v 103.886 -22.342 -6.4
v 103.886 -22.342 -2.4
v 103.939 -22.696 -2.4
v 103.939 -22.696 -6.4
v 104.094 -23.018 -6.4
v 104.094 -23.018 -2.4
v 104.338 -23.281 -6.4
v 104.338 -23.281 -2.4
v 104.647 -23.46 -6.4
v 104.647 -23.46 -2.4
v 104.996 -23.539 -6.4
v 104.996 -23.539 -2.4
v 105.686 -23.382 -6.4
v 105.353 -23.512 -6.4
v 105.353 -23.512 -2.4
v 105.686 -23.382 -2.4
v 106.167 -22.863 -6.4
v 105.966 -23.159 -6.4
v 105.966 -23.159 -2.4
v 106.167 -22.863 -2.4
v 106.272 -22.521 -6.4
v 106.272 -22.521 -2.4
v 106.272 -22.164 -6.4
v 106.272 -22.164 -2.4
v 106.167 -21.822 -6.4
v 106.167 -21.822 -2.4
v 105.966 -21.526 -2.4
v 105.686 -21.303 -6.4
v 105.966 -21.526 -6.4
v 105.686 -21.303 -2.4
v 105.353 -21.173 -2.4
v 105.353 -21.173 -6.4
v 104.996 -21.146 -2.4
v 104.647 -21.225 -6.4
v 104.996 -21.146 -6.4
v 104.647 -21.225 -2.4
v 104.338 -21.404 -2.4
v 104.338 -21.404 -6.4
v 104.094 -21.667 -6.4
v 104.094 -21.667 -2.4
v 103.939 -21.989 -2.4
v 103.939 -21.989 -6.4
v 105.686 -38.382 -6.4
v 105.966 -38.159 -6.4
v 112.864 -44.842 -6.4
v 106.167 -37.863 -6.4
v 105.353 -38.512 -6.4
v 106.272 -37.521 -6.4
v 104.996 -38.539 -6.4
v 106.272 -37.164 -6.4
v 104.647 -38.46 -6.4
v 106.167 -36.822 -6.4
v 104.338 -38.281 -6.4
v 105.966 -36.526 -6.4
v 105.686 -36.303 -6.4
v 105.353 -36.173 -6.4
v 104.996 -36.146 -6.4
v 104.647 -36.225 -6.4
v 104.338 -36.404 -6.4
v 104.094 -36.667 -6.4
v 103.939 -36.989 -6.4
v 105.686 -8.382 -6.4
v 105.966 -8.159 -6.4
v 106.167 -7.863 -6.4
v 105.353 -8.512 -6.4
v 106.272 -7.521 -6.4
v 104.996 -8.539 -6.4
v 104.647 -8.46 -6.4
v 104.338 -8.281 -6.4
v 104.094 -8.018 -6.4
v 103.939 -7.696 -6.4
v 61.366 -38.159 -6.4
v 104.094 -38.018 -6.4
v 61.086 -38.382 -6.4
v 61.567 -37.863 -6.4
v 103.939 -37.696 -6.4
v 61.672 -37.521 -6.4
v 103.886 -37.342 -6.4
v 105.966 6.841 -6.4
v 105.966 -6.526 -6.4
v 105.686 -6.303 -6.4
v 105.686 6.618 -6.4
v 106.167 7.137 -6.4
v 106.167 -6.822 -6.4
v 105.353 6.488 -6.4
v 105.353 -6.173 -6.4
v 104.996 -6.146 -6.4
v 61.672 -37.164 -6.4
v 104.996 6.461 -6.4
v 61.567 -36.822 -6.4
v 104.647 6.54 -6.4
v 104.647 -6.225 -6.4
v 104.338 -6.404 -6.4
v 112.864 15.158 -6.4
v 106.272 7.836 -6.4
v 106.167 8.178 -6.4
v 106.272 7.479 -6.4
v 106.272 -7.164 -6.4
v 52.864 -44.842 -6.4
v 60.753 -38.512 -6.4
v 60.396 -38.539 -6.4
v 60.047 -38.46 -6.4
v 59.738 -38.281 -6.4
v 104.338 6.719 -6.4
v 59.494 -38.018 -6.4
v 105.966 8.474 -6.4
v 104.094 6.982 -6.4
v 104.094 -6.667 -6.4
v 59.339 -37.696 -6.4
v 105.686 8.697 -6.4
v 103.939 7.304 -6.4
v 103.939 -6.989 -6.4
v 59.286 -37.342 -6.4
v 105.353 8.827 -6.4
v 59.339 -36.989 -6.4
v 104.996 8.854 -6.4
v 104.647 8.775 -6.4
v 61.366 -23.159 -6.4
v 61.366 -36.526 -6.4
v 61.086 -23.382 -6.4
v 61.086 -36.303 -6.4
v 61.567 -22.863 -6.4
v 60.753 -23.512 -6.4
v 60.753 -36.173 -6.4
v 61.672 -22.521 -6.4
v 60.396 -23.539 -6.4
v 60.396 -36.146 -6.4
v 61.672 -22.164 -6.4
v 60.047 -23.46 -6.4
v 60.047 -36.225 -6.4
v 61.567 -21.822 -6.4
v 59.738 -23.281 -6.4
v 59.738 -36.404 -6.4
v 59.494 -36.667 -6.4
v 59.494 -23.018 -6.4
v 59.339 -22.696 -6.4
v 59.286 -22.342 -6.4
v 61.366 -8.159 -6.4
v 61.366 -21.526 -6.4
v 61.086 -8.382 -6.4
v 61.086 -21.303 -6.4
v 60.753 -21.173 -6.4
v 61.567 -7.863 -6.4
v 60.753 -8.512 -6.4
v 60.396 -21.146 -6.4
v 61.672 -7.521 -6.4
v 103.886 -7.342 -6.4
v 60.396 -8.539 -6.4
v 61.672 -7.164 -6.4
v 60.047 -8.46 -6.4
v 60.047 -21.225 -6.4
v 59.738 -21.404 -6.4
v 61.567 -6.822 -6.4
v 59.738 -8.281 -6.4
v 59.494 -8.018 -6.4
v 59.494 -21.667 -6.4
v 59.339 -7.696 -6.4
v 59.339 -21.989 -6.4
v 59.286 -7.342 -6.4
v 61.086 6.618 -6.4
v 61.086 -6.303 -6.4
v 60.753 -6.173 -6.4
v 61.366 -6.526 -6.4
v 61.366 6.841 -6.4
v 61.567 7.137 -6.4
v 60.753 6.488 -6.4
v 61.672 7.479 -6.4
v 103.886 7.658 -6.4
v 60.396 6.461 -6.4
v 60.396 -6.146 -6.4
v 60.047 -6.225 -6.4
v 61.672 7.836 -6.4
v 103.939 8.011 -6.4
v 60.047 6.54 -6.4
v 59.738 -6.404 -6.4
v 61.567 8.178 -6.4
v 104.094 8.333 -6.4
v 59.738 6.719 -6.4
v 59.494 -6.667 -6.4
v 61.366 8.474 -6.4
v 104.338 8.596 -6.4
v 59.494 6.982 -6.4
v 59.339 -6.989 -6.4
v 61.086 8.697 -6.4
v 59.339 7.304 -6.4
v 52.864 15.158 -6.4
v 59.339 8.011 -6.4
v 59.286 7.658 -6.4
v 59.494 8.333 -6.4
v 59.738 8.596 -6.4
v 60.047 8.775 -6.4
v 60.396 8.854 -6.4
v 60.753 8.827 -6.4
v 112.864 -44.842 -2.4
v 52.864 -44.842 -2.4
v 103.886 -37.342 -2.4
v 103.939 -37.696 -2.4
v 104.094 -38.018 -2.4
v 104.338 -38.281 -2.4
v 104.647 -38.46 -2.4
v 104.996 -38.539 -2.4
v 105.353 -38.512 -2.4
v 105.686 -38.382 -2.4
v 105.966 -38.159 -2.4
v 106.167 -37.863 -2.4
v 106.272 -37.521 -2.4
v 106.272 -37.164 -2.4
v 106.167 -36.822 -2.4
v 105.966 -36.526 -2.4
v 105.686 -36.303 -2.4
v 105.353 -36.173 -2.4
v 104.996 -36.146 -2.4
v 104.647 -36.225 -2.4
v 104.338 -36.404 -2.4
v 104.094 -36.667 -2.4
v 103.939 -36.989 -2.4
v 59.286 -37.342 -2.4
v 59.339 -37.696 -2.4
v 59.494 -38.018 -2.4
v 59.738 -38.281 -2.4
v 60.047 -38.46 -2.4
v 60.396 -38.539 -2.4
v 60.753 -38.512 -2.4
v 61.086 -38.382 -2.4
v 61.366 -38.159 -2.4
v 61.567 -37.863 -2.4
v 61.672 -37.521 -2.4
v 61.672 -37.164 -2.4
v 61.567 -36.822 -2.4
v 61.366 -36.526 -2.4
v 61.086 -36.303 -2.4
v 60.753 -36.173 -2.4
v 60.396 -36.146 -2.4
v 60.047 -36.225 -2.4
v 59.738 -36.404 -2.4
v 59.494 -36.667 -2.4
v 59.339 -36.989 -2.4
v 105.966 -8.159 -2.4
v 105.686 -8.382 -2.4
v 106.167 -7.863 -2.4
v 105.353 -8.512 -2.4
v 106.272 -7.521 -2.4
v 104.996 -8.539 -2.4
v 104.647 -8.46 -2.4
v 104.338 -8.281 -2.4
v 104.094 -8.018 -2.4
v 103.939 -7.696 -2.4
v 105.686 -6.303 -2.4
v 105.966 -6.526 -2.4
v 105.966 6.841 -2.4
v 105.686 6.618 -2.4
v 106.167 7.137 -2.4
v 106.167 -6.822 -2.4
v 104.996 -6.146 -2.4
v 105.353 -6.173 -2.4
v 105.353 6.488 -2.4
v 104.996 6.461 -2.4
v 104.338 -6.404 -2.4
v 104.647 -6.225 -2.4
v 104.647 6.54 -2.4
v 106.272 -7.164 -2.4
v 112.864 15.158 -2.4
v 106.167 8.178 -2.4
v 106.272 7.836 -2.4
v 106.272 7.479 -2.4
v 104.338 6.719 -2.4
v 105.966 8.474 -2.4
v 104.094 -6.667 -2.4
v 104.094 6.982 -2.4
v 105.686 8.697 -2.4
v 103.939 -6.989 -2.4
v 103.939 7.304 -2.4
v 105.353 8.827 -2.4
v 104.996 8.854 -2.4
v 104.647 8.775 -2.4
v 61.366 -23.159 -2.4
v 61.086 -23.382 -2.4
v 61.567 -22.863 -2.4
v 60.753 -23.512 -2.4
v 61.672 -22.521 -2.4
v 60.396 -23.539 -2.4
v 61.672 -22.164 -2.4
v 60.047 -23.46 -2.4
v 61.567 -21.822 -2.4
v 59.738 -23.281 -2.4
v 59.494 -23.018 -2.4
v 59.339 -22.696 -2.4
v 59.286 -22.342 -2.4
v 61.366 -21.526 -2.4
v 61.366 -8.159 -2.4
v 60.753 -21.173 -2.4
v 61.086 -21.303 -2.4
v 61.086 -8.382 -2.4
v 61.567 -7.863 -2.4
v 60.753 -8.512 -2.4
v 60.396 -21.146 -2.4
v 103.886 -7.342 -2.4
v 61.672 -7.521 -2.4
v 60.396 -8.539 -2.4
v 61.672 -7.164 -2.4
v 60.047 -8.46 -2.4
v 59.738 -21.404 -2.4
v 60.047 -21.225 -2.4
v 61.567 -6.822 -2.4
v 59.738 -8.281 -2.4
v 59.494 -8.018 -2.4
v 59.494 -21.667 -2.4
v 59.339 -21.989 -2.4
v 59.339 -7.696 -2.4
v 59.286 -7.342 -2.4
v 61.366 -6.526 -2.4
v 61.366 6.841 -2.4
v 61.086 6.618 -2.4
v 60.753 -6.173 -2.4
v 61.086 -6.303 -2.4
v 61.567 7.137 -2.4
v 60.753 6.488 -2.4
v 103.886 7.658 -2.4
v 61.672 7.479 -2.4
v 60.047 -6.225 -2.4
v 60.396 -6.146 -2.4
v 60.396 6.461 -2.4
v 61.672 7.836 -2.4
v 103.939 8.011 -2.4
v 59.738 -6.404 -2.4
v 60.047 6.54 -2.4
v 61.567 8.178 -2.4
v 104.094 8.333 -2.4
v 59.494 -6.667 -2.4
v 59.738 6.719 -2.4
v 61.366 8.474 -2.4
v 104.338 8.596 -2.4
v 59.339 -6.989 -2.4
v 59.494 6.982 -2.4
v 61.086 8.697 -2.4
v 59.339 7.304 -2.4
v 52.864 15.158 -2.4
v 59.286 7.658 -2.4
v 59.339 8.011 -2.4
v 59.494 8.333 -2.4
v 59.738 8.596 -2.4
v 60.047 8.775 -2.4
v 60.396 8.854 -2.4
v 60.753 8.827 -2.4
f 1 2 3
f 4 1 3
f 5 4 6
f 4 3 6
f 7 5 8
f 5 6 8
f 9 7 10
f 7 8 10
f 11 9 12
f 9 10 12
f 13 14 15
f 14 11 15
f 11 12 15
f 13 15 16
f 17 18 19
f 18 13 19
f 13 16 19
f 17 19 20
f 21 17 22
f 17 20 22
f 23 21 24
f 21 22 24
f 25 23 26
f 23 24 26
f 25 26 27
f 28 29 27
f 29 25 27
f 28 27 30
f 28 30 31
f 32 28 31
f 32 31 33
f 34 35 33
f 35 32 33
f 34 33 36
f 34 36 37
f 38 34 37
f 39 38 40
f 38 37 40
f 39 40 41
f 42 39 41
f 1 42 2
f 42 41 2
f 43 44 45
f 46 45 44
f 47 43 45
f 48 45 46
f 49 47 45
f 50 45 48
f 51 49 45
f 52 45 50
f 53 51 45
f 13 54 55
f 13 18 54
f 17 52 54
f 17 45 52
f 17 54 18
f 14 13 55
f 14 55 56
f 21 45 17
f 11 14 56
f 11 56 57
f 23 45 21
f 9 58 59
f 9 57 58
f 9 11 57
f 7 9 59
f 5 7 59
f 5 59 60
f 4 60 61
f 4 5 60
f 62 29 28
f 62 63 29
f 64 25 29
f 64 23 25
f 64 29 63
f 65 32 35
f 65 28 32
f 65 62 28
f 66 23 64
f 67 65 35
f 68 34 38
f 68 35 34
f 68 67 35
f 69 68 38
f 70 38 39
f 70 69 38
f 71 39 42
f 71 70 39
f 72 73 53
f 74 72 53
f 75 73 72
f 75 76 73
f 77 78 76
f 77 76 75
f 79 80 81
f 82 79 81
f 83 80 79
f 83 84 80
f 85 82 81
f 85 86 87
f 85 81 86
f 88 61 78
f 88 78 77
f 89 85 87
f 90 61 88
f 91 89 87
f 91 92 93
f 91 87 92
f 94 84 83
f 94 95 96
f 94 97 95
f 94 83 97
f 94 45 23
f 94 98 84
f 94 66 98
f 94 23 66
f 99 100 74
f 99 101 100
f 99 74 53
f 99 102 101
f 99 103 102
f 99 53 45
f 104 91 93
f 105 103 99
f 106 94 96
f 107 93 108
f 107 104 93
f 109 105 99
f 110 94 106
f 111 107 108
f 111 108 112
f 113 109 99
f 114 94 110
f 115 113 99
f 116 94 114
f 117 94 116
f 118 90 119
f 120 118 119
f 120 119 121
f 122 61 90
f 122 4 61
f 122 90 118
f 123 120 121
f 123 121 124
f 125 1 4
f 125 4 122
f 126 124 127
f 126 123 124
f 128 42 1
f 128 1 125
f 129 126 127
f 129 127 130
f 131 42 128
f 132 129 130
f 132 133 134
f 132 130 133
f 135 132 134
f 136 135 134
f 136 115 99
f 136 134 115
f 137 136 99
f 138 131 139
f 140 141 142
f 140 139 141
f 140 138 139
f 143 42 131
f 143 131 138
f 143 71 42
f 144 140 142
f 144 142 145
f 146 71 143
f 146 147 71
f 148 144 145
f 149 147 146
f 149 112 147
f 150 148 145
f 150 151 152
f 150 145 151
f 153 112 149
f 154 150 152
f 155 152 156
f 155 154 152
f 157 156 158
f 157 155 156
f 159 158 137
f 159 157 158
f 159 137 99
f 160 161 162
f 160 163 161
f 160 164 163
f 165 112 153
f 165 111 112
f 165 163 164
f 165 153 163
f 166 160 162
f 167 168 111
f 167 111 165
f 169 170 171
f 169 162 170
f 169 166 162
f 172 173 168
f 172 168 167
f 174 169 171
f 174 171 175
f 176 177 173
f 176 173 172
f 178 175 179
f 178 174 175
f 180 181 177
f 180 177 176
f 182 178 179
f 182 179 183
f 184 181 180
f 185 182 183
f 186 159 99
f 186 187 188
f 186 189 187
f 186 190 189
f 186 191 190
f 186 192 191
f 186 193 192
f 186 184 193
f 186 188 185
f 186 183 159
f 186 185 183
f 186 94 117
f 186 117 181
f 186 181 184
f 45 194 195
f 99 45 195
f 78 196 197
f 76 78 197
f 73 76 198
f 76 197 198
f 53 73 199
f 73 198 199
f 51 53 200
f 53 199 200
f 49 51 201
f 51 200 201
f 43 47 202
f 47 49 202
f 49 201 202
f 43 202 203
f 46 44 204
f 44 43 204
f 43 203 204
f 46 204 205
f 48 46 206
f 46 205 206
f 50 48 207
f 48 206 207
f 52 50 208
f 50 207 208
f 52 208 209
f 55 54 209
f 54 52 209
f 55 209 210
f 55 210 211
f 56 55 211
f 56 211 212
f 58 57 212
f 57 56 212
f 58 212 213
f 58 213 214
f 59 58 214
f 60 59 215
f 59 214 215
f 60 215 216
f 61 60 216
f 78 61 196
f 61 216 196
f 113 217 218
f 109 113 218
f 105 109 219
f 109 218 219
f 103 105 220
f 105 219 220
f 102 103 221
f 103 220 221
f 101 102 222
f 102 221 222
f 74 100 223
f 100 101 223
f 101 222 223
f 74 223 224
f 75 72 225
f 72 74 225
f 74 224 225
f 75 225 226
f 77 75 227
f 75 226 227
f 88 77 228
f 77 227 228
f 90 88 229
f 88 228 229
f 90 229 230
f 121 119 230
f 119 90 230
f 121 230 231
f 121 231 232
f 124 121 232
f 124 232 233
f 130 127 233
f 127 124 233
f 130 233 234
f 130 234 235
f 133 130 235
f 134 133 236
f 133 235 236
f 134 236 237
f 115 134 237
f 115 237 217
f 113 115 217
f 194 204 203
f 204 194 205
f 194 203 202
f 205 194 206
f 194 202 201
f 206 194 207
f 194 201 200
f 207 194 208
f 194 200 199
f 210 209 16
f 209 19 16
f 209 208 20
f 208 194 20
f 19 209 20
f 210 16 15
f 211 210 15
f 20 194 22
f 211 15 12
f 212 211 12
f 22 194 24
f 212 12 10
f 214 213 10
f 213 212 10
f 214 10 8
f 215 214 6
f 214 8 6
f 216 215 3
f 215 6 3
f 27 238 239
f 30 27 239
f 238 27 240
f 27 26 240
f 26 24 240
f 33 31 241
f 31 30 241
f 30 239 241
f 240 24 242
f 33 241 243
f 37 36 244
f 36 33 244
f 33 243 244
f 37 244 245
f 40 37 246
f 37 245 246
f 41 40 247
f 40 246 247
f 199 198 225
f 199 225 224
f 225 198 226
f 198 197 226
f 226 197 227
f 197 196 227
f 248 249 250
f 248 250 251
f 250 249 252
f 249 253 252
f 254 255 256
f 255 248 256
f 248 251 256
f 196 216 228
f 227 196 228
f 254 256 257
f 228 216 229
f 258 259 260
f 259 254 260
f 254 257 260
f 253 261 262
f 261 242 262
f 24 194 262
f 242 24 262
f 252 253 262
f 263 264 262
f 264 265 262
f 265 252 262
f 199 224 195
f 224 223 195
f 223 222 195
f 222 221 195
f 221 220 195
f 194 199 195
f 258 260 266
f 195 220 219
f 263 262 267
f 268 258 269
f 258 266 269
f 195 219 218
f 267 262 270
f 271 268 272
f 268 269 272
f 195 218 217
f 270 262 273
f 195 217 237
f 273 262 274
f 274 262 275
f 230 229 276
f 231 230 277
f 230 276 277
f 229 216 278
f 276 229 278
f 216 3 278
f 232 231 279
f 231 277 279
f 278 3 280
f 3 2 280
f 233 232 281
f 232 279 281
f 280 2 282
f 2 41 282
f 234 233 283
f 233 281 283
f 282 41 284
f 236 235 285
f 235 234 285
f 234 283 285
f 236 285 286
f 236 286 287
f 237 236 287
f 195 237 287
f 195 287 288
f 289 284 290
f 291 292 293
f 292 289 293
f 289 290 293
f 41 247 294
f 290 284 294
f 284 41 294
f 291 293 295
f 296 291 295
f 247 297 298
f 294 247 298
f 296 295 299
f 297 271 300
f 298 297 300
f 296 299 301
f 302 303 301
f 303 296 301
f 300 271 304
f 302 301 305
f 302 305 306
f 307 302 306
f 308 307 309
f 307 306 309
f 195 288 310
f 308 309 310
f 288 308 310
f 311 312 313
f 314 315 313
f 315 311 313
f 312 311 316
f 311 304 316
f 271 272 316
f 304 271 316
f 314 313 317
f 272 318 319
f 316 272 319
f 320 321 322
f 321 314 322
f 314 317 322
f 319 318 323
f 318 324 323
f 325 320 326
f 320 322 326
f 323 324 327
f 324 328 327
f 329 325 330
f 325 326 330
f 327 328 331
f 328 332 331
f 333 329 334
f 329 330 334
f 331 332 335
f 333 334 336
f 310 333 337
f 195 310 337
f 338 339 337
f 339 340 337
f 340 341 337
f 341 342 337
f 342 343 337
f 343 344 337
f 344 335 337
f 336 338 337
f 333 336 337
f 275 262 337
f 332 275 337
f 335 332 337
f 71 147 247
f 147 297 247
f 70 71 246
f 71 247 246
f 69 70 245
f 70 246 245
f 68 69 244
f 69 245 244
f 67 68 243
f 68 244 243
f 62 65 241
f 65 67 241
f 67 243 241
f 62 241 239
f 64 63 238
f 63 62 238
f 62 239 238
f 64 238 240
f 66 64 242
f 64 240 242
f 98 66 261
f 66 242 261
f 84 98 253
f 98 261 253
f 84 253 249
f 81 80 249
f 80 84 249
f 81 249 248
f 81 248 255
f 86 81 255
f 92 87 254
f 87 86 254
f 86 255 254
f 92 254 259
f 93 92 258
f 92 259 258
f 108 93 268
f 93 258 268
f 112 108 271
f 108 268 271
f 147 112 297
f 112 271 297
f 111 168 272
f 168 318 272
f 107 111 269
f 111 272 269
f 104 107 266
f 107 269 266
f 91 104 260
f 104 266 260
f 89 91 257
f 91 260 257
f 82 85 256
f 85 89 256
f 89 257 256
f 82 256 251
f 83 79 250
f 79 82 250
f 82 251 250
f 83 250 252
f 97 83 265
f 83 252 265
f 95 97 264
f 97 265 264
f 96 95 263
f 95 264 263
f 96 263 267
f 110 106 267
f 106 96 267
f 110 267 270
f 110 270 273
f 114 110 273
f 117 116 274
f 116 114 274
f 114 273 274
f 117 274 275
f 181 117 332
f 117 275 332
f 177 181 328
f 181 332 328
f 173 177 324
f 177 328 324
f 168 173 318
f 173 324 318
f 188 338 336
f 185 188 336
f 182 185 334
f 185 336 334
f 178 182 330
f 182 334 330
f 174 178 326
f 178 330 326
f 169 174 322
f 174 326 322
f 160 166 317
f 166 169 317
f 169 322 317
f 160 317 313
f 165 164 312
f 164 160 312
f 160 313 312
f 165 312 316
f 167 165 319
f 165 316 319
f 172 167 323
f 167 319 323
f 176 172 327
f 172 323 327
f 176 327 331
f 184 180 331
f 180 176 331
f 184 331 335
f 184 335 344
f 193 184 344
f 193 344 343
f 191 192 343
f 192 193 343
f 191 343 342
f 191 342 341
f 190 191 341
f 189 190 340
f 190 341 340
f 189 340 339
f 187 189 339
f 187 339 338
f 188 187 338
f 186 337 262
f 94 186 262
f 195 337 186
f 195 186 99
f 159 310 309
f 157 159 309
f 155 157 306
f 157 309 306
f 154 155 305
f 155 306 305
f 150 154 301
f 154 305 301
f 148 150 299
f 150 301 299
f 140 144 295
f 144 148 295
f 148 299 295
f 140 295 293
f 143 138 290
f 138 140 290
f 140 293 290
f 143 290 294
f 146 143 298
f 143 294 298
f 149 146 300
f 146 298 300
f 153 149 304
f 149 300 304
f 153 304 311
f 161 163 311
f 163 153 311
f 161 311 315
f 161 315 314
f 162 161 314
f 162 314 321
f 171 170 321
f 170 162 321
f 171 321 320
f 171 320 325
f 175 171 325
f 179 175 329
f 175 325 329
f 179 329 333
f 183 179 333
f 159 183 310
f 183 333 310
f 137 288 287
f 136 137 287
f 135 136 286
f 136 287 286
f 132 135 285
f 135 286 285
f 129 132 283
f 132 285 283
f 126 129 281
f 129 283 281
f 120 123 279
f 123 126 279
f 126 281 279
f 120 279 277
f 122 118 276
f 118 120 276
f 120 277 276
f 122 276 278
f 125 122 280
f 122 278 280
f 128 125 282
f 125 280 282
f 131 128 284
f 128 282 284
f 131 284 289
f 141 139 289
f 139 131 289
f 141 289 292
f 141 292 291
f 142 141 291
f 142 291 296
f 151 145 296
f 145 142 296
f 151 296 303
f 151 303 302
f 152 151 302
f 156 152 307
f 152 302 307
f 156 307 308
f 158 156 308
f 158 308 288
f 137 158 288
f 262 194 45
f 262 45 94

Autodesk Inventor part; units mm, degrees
ref_plane "YZ Plane" through (0, 0, 0) normal (1, 0, 0) x (0, 1, 0)
ref_plane "XZ Plane" through (0, 0, 0) normal (0, 1, 0) x (-1, 0, 0)
ref_plane "XY Plane" through (0, 0, 0) normal (0, 0, 1) x (1, 0, 0)
ref_plane "РабПлоскость2" through (101.7859, 42.6575, -2.4) normal (0, 0, -1) x (-1, 0, 0)
sketch "Эскиз2" plane through (101.7859, 42.6575, -2.4) normal (0, 0, -1) x (-1, 0, 0)
  line L0 (-6.6, -87.5) -> (0, -87.5) projected
  line L1 (0, -27.5) -> (0, -87.5) projected
  line L2 (0, -27.5) -> (-6.6, -27.5) projected
  line L3 (-6.6, -27.5) -> (-6.6, -87.5) projected
  circle A0 centre (-3.3, -35) radius 2.3 projected
  circle A1 centre (-3.3, -50) radius 2.3 projected
  circle A2 centre (-3.3, -65) radius 2.3 projected
  circle A3 centre (-3.3, -80) radius 2.3 projected
  line L4 (38, -87.5) -> (44.6, -87.5) projected
  line L5 (44.6, -27.5) -> (44.6, -87.5) projected
  line L6 (44.6, -27.5) -> (38, -27.5) projected
  line L7 (38, -27.5) -> (38, -87.5) projected
  circle A4 centre (41.3, -35) radius 2.3 projected
  circle A5 centre (41.3, -50) radius 2.3 projected
  circle A6 centre (41.3, -65) radius 2.3 projected
  circle A7 centre (41.3, -80) radius 2.3 projected
  line L8 (-11.0784, -27.5) -> (48.9216, -27.5)
  line L9 (48.9216, -27.5) -> (48.9216, -87.5)
  line L10 (48.9216, -87.5) -> (-11.0784, -87.5)
  line L11 (-11.0784, -87.5) -> (-11.0784, -27.5)
  line L12 (18.9216, -50) -> (18.9216, -69.7785)
  circle A8 centre (-3.3, -35) radius 1.2 projected
  circle A9 centre (-3.3, -50) radius 1.2 projected
  circle A10 centre (-3.3, -65) radius 1.2 projected
  circle A11 centre (-3.3, -80) radius 1.2 projected
  circle A12 centre (41.3, -80) radius 1.2 projected
  circle A13 centre (41.3, -65) radius 1.2 projected
  circle A14 centre (41.3, -50) radius 1.2 projected
  circle A15 centre (41.3, -35) radius 2.1 projected
  circle A16 centre (41.3, -35) radius 1.2 projected
  point P0 (101.7859, -42.6575)
  point P1 (0, -87.5)
  point P2 (0, -27.5)
  point P3 (-6.6, -27.5)
  dimension "d3" = 60
  dimension "d4" = 60
  dimension "d5" = 30
extrude "Выдавливание2" add sketch "Эскиз2" along normal blind 4 contours L3 L2 L1 L0 | L10 L11 L8 L3 | L1 L8 L7 L10 | L7 L6 L5 L4 | L5 L8 L9 L10 | A0 | A1 | A2 | A3 | A4 | A5 | A6 | A7 | A15
properties part number "деталь которая двигает"
